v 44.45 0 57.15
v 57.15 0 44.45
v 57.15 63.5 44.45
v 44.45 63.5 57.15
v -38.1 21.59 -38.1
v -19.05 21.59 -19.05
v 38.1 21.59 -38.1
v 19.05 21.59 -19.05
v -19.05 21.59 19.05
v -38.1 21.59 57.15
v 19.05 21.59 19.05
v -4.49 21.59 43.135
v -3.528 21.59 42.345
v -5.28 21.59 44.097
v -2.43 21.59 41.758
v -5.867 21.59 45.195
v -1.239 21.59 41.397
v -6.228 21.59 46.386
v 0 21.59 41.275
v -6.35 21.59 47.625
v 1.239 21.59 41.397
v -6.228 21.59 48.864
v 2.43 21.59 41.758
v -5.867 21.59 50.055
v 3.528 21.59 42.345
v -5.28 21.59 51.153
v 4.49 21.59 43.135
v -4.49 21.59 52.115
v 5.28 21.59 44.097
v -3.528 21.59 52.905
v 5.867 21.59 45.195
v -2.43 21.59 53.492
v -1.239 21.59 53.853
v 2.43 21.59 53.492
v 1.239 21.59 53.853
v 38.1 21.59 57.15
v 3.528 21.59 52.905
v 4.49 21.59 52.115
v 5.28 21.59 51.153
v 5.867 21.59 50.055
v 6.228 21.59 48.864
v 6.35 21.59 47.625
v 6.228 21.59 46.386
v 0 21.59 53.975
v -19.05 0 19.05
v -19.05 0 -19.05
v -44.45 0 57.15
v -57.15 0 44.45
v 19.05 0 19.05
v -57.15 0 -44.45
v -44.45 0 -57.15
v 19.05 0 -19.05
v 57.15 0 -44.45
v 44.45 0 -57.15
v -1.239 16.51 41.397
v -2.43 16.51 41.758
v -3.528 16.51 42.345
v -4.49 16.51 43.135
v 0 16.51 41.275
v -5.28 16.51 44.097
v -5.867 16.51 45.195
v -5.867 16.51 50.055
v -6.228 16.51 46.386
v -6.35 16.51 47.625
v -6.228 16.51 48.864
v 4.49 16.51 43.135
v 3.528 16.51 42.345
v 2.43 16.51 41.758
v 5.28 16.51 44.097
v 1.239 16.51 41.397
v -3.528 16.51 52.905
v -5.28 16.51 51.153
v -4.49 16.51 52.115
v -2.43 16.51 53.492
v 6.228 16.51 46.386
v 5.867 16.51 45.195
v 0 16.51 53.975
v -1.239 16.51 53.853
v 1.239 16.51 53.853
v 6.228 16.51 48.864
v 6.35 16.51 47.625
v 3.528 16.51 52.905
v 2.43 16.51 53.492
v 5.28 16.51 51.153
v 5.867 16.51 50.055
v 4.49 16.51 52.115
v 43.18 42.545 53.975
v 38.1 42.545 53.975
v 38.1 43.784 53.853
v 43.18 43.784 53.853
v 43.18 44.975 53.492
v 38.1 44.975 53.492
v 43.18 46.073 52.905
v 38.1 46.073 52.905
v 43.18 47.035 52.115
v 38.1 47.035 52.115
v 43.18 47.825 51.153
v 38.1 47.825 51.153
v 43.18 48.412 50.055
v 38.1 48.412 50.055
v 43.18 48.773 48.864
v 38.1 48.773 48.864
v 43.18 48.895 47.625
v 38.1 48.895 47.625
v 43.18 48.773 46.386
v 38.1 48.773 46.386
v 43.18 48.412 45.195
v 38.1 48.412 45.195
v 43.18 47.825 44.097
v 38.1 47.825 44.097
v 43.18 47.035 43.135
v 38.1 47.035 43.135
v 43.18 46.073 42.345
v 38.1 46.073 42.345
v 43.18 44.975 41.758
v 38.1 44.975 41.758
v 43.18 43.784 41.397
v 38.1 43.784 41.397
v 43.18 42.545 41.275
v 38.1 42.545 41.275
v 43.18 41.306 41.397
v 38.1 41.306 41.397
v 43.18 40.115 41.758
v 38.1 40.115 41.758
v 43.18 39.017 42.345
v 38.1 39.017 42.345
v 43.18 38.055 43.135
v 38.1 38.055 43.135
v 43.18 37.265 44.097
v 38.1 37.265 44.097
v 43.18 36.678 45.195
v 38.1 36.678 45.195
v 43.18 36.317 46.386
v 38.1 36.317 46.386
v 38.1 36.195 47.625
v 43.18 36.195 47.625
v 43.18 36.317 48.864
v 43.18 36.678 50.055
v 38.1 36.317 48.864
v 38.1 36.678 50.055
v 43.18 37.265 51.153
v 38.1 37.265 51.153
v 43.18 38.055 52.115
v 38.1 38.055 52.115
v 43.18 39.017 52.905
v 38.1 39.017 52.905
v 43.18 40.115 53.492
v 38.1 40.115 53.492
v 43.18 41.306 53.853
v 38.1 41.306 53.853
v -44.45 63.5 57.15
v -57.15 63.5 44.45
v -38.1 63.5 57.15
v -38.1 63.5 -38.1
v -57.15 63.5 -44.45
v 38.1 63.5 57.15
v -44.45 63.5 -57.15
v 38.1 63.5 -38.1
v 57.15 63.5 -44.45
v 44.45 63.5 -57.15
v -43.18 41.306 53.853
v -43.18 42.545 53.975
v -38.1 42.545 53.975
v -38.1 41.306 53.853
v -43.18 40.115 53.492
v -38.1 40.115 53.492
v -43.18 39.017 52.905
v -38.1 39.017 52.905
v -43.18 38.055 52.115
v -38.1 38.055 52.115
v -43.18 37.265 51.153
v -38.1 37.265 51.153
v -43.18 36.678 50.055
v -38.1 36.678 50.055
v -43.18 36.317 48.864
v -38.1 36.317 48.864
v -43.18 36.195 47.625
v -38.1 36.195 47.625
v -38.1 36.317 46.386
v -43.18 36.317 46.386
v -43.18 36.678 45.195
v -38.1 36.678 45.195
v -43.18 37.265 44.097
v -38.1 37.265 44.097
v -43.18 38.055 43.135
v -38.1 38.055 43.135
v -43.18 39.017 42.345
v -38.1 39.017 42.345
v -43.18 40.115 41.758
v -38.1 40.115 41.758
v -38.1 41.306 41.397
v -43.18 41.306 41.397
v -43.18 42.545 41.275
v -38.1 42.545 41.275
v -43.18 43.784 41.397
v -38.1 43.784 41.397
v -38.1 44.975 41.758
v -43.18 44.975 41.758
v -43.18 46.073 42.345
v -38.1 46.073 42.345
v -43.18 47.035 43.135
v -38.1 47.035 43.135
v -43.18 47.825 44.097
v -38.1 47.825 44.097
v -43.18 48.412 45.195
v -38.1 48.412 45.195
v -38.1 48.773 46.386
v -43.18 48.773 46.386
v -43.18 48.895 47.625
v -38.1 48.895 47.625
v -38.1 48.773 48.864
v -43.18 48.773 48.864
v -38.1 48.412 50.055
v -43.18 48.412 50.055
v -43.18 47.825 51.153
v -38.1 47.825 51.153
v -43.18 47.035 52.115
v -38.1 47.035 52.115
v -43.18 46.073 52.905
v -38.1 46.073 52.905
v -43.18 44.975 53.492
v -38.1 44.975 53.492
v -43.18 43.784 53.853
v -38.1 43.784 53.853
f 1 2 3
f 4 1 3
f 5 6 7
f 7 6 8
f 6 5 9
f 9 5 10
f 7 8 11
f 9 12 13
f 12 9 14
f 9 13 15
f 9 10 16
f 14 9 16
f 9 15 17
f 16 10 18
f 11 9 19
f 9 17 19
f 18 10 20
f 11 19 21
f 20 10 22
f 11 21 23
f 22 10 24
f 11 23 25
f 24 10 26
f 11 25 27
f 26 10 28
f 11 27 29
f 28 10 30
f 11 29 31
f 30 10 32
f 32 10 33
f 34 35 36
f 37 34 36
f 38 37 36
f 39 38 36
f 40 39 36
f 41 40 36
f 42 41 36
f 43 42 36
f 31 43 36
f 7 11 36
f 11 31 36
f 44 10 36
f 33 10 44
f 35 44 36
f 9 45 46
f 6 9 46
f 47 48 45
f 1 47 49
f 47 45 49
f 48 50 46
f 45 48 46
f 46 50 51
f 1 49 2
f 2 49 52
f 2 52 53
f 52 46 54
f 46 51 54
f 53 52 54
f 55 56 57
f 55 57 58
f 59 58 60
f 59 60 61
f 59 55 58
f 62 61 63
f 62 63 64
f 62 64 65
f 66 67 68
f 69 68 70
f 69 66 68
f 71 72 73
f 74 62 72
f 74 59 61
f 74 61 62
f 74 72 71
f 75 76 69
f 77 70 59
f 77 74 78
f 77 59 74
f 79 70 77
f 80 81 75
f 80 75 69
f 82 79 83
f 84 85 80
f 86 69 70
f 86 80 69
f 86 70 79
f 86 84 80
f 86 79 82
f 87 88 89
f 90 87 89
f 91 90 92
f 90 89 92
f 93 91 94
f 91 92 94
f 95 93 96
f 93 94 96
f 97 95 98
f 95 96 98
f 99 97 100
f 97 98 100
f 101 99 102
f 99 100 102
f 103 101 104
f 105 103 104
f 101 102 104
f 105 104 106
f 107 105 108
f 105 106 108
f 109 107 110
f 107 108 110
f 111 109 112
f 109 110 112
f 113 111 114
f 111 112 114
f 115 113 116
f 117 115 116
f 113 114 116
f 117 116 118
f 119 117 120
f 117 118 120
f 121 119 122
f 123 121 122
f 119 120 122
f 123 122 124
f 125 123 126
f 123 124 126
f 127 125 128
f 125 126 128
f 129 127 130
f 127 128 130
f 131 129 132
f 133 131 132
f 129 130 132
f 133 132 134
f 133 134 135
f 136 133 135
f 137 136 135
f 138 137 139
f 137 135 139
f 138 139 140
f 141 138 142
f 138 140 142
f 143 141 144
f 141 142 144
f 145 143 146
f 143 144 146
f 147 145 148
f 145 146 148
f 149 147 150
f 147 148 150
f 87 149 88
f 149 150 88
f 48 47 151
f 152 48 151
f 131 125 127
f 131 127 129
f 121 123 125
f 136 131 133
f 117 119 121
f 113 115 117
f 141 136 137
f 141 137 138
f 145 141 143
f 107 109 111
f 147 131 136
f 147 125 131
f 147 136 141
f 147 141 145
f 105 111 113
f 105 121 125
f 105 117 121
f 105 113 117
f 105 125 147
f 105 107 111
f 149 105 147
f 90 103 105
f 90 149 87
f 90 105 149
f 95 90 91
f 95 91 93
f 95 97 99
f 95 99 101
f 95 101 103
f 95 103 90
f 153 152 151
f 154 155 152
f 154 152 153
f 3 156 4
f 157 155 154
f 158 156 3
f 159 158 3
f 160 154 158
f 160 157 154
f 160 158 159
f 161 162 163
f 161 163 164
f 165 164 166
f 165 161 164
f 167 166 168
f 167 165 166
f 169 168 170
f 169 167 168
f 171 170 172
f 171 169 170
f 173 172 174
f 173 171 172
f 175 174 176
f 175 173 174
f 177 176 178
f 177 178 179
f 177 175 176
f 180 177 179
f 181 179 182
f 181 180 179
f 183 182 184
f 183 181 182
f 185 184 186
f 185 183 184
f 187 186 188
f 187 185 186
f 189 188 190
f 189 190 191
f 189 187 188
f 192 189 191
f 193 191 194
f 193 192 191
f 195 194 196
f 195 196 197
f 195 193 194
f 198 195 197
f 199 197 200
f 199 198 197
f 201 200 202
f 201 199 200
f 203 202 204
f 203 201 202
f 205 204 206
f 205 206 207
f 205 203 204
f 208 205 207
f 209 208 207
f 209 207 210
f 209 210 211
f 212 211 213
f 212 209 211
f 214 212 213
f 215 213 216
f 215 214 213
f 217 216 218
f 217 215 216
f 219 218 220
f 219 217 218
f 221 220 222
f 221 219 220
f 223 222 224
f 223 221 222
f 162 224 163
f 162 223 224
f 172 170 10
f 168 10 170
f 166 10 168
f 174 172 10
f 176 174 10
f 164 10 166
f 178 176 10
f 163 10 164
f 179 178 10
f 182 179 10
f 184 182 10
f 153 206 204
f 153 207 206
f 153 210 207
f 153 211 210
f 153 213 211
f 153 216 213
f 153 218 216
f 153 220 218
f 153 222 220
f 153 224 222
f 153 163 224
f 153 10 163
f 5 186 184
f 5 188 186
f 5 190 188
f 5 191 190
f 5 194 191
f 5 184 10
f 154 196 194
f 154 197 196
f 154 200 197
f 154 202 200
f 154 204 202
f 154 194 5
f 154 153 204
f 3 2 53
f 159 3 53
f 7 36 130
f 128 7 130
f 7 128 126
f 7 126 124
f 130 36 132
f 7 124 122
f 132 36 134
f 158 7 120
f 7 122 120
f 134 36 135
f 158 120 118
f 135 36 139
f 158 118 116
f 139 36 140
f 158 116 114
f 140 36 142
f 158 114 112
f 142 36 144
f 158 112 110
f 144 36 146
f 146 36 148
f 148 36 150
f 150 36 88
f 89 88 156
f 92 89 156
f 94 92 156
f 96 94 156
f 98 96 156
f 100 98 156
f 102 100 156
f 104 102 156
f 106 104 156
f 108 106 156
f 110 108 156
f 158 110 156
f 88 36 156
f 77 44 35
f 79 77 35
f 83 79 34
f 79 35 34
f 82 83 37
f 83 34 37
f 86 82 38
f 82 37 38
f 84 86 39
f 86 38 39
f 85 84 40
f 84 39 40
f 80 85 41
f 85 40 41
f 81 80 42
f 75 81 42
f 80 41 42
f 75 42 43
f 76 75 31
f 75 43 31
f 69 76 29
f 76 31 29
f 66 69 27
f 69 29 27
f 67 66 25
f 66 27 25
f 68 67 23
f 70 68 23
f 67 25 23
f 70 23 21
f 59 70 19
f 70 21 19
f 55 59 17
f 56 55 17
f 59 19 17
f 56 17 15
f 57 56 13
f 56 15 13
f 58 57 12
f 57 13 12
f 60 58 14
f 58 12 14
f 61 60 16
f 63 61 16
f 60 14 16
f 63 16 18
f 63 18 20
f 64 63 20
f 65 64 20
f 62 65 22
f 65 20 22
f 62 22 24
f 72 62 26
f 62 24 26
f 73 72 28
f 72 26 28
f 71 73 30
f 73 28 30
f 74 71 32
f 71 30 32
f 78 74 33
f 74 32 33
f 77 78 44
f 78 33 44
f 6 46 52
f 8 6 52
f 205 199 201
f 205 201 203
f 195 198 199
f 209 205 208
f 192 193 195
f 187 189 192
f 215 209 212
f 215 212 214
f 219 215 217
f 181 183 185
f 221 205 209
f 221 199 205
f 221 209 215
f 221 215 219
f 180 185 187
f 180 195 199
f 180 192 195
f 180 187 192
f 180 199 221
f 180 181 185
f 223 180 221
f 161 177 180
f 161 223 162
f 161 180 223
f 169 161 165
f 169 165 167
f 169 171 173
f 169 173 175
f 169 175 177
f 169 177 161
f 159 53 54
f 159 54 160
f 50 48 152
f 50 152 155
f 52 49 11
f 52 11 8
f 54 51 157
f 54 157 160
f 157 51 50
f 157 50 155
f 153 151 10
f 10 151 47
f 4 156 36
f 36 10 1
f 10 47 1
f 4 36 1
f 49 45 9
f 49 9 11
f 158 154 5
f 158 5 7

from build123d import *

# Parameters (mm, degrees)
SKETCH1_W           = 114.3
SKETCH1_H           = 114.3
SKETCH1_W_2         = 38.1
SKETCH1_H_2         = 38.1
BOSS_EXTRUDE1_DEPTH = 76.2
SKETCH3_W           = 76.2
SKETCH3_H           = 76.2
CUT_EXTRUDE2_DEPTH  = 54.61
SKETCH5_W           = 114.3
SKETCH5_H           = 114.3
SKETCH5_W_2         = 76.2
SKETCH5_H_2         = 76.2
CUT_EXTRUDE3_DEPTH  = 12.7
CHAMFER1_SIZE       = 12.7
CUT_EXTRUDE4_REACH  = 144.699
SKETCH6_W           = 76.2
SKETCH6_H           = 41.91
SKETCH7_R           = 6.35
CUT_EXTRUDE5_DEPTH  = 5.08
SKETCH9_R           = 6.35
CUT_EXTRUDE6_DEPTH  = 5.08
CUT_EXTRUDE7_START  = -5.08
SKETCH8_R           = 6.35
CUT_EXTRUDE7_DEPTH  = 5.08


with BuildPart() as part:
    # Sketch1 → Boss-Extrude1 (new body)
    with BuildSketch(Plane(origin=(0, 0, 0), x_dir=(1, 0, 0), z_dir=(0, 1, 0))):
        Rectangle(SKETCH1_W, SKETCH1_H)
        Rectangle(SKETCH1_W_2, SKETCH1_H_2, mode=Mode.SUBTRACT)
    extrude(amount=BOSS_EXTRUDE1_DEPTH)

    # Sketch3 → Cut-Extrude2 (cut)
    with BuildSketch(Plane(origin=(0, 76.2, 0), x_dir=(1, 0, 0), z_dir=(0, 1, 0))):
        Rectangle(SKETCH3_W, SKETCH3_H)
    extrude(amount=-CUT_EXTRUDE2_DEPTH, mode=Mode.SUBTRACT)

    # Sketch5 → Cut-Extrude3 (cut)
    with BuildSketch(Plane(origin=(0, 76.2, 0), x_dir=(1, 0, 0), z_dir=(0, 1, 0))):
        Rectangle(SKETCH5_W, SKETCH5_H)
        Rectangle(SKETCH5_W_2, SKETCH5_H_2, mode=Mode.SUBTRACT)
    extrude(amount=-CUT_EXTRUDE3_DEPTH, mode=Mode.SUBTRACT)

    # Chamfer1
    chamfer1_edges = [part.edges().sort_by_distance(p)[0] for p in [
        (57.15, 31.75, 57.15),
        (-57.15, 31.75, 57.15),
        (-57.15, 31.75, -57.15),
        (57.15, 31.75, -57.15),
    ]]
    chamfer(chamfer1_edges, length=CHAMFER1_SIZE)

    # Sketch6 → Cut-Extrude4 (cut, up to next)
    with BuildSketch(Plane.XY.offset(57.15), mode=Mode.PRIVATE) as cut_extrude4_sk1:
        with Locations((0, 42.545)):
            Rectangle(SKETCH6_W, SKETCH6_H)
    cut_extrude4_tool1 = extrude(cut_extrude4_sk1.sketch, amount=-CUT_EXTRUDE4_REACH, mode=Mode.PRIVATE) & part.part
    add(cut_extrude4_tool1.solids().sort_by_distance((0, 42.545, 57.15))[0], mode=Mode.SUBTRACT)

    # Sketch7 → Cut-Extrude5 (cut)
    with BuildSketch(Plane(origin=(0, 21.59, 0), x_dir=(1, 0, 0), z_dir=(0, 1, 0))):
        with Locations(Location((0, -47.625, 0), (0, 0, 270))):
            Circle(SKETCH7_R)
    extrude(amount=-CUT_EXTRUDE5_DEPTH, mode=Mode.SUBTRACT)

    # Sketch9 → Cut-Extrude6 (cut)
    with BuildSketch(Plane.ZY.offset(-38.1)):
        with Locations((47.625, 42.545)):
            Circle(SKETCH9_R)
    extrude(amount=-CUT_EXTRUDE6_DEPTH, mode=Mode.SUBTRACT)

    # Sketch8 → Cut-Extrude7 (cut)
    with BuildSketch(Plane(origin=(-38.1, 0, 0), x_dir=(0, 0, -1), z_dir=(1, 0, 0)).offset(CUT_EXTRUDE7_START)):
        with Locations(Location((-47.625, 42.545, 0), (0, 0, 180))):
            Circle(SKETCH8_R)
    extrude(amount=CUT_EXTRUDE7_DEPTH, mode=Mode.SUBTRACT)


solid = part.part
